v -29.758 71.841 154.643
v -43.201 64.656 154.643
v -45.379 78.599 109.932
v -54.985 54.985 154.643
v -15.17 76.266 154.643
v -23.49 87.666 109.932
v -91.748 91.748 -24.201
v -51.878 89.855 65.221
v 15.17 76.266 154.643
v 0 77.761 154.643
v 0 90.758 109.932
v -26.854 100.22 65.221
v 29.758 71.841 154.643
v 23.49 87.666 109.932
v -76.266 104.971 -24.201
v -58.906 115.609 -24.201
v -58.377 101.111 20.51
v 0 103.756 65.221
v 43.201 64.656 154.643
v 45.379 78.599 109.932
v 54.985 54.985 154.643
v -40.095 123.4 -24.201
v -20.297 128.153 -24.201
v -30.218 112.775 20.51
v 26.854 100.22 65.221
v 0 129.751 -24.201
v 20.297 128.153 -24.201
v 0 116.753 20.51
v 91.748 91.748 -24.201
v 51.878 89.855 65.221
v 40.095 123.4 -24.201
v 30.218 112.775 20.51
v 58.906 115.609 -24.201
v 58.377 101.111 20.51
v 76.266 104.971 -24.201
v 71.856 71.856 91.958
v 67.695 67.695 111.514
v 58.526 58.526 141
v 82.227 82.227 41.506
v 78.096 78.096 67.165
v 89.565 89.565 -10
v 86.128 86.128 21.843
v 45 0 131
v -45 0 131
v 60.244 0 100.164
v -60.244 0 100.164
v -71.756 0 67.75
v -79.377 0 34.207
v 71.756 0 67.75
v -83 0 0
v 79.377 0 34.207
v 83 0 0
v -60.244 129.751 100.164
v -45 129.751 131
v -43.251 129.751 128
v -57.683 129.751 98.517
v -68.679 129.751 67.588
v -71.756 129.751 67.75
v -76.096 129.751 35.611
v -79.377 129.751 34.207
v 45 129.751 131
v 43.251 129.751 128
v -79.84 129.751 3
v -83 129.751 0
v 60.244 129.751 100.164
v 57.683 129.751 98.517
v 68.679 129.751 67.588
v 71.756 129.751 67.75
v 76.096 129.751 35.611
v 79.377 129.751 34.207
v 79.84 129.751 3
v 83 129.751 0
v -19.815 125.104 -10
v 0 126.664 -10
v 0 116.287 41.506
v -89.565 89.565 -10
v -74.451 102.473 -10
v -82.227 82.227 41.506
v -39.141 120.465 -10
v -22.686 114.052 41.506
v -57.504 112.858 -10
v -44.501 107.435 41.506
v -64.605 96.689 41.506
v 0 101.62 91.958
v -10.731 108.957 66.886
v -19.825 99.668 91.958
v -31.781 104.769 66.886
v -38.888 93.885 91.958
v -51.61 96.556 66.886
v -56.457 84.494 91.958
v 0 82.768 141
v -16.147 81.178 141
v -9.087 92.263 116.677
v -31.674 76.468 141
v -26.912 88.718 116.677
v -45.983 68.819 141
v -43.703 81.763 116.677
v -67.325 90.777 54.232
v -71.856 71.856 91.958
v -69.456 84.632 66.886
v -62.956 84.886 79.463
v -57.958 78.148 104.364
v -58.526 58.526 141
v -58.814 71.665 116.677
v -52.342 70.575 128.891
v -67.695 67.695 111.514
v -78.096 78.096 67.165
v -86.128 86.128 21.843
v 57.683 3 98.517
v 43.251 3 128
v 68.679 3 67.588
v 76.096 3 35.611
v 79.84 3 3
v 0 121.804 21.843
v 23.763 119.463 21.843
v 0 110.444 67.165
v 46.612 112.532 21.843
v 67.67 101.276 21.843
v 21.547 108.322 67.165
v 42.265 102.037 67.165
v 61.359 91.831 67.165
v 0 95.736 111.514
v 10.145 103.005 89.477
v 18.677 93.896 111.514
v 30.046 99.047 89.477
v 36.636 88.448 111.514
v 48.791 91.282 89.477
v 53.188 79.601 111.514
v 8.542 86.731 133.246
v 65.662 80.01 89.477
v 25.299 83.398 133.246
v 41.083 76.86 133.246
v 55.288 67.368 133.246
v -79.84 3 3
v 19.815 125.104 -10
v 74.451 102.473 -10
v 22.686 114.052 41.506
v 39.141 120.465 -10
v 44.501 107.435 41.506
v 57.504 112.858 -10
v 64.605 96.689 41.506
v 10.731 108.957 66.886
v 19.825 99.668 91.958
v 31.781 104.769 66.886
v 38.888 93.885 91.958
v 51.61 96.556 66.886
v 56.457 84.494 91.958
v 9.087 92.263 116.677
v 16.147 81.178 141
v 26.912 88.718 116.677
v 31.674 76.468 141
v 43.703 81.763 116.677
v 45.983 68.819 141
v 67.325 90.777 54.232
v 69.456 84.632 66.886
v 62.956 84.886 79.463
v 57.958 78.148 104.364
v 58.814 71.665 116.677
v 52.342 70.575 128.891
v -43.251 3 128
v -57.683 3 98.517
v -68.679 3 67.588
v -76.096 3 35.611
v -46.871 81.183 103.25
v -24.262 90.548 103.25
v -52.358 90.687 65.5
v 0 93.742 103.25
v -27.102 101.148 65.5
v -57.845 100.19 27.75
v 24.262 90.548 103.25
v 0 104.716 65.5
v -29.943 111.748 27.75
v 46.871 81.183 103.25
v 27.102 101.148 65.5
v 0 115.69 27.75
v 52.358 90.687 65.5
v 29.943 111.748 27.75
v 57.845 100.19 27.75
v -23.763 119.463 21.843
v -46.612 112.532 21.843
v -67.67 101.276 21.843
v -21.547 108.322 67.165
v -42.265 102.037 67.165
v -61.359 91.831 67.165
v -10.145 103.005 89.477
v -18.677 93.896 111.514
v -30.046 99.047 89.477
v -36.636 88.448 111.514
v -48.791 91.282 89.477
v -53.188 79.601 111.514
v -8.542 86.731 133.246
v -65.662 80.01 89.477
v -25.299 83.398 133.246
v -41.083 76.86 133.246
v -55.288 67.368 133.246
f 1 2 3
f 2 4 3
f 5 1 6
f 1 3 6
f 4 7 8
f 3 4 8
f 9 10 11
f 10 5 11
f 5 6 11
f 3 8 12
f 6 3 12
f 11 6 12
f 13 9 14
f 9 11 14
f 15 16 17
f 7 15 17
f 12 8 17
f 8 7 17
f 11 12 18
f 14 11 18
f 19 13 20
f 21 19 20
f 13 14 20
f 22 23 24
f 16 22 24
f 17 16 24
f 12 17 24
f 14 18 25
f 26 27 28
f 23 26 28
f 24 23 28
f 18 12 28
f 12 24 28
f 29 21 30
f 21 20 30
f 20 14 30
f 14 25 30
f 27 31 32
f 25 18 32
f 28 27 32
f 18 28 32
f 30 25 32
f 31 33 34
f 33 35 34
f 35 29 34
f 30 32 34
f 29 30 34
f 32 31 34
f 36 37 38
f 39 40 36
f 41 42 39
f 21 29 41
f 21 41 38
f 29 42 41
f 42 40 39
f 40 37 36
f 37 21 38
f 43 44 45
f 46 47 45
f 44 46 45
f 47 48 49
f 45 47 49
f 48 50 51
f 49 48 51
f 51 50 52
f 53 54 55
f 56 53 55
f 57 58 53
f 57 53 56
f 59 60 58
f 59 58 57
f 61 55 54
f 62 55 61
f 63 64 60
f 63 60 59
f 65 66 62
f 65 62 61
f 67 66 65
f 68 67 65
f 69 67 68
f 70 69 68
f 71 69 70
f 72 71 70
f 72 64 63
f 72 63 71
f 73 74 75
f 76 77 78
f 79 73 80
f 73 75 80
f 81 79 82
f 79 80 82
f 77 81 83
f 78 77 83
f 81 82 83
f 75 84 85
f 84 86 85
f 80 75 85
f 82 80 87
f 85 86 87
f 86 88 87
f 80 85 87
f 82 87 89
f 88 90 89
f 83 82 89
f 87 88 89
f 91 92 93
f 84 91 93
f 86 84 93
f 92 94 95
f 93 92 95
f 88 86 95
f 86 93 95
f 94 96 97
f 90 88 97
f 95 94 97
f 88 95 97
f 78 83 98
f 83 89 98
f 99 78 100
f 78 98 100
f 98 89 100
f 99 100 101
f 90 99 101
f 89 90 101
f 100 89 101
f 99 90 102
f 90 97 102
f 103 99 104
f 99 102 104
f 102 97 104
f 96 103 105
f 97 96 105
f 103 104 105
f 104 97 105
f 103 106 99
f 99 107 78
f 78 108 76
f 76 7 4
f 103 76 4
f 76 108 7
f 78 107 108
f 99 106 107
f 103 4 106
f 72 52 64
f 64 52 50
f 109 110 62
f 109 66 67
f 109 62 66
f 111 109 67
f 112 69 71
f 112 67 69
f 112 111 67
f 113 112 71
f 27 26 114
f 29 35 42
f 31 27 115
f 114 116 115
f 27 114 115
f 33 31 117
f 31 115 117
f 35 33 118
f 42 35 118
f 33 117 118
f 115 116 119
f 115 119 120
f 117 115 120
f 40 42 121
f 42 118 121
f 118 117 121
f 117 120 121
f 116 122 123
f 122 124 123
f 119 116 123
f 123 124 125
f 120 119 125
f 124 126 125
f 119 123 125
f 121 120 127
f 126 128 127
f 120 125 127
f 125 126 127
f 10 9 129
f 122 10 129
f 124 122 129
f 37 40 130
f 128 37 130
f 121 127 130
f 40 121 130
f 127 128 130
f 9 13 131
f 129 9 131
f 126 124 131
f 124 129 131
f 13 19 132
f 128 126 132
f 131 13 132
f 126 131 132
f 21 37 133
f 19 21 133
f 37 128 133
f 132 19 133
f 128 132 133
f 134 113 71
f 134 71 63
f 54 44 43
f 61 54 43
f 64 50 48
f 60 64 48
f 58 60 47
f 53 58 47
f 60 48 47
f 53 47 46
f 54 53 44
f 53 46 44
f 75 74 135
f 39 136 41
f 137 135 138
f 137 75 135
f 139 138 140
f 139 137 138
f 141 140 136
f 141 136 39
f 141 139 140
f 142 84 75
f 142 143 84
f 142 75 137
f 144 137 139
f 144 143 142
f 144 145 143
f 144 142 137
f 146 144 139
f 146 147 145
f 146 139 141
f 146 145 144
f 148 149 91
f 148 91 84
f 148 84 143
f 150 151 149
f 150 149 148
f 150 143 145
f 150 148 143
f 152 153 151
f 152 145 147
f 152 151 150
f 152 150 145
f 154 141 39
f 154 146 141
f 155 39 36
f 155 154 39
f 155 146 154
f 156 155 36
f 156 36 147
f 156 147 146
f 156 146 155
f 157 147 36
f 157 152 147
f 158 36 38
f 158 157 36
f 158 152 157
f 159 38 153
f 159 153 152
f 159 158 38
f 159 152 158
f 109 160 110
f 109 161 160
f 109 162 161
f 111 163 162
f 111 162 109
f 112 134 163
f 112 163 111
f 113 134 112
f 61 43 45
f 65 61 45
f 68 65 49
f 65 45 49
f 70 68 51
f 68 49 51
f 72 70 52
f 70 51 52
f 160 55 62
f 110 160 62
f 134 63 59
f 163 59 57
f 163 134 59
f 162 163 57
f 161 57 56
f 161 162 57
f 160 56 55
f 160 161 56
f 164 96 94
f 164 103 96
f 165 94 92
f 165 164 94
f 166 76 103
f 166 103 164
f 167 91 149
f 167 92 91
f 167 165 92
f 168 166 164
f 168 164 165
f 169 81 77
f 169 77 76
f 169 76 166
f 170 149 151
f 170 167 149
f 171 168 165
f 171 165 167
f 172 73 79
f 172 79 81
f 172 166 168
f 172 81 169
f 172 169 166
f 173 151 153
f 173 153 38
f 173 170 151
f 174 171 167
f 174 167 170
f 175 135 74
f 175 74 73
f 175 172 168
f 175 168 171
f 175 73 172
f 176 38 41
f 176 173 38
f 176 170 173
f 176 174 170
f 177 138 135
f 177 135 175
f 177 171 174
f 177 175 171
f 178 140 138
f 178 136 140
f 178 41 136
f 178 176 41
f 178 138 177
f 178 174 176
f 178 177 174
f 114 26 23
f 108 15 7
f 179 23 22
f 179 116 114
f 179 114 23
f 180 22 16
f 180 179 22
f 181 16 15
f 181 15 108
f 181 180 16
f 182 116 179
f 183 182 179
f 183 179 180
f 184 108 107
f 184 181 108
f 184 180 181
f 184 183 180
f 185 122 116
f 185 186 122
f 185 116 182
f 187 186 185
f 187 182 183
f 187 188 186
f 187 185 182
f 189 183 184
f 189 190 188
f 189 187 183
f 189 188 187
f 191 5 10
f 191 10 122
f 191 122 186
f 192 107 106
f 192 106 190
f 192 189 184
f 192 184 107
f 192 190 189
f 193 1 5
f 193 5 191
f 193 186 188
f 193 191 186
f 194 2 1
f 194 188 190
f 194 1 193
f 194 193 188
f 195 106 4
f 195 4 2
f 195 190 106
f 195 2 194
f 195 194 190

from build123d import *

# Parameters (mm, degrees)
REVOLVE_1_ANGLE = 90
EXTRUDE_1_DEPTH = 129.750797
SHELL_1_T       = -3


with BuildPart() as part:
    # Эскиз3 → Повернуть-Тонкостенный1 (revolve, symmetric)
    with BuildSketch(Plane(origin=(0, 0, 0), x_dir=(0, 0, -1), z_dir=(1, 0, 0))) as revolve_1_sk:
        with BuildLine():
            Line((-154.642813074, 77.760520192), (24.201105378, 129.750796682))
            ThreePointArc((24.201105378, 129.750796682), (-67.165189144, 110.444073397), (-154.642813074, 77.760520192))
        make_face()
        with BuildLine():
            Line((-141, 82.767909565), (10, 126.663904563))
            ThreePointArc((10, 126.663904563), (-66.886042992, 109.48382477), (-141, 82.767909565))
        make_face(mode=Mode.SUBTRACT)
    revolve(axis=Axis((0, 0, 0), (0, 0, 1)), revolution_arc=REVOLVE_1_ANGLE / 2)
    revolve(revolve_1_sk.sketch, axis=Axis((0, 0, 0), (0, 0, -1)), revolution_arc=REVOLVE_1_ANGLE / 2)


with BuildPart() as body_2:
    # Эскиз1 → Бобышка-Вытянуть1 (new body)
    with BuildSketch(Plane(origin=(0, 0, 0), x_dir=(1, 0, 0), z_dir=(0, 1, 0))):
        with BuildLine():
            Line((-45, -131), (45, -131))
            ThreePointArc((45, -131), (71.756415779, -67.749952669), (83, 0))
            Line((83, 0), (-83, 0))
            ThreePointArc((-83, 0), (-71.756415779, -67.749952669), (-45, -131))
        make_face()
    extrude(amount=EXTRUDE_1_DEPTH)

    # Оболочка1
    shell_1_openings = [body_2.faces().sort_by_distance(p)[0] for p in [
        (0, 129.750797, 59.614369669),
    ]]
    offset(amount=SHELL_1_T, openings=shell_1_openings, kind=Kind.INTERSECTION)


solid = Compound([part.part, body_2.part])
